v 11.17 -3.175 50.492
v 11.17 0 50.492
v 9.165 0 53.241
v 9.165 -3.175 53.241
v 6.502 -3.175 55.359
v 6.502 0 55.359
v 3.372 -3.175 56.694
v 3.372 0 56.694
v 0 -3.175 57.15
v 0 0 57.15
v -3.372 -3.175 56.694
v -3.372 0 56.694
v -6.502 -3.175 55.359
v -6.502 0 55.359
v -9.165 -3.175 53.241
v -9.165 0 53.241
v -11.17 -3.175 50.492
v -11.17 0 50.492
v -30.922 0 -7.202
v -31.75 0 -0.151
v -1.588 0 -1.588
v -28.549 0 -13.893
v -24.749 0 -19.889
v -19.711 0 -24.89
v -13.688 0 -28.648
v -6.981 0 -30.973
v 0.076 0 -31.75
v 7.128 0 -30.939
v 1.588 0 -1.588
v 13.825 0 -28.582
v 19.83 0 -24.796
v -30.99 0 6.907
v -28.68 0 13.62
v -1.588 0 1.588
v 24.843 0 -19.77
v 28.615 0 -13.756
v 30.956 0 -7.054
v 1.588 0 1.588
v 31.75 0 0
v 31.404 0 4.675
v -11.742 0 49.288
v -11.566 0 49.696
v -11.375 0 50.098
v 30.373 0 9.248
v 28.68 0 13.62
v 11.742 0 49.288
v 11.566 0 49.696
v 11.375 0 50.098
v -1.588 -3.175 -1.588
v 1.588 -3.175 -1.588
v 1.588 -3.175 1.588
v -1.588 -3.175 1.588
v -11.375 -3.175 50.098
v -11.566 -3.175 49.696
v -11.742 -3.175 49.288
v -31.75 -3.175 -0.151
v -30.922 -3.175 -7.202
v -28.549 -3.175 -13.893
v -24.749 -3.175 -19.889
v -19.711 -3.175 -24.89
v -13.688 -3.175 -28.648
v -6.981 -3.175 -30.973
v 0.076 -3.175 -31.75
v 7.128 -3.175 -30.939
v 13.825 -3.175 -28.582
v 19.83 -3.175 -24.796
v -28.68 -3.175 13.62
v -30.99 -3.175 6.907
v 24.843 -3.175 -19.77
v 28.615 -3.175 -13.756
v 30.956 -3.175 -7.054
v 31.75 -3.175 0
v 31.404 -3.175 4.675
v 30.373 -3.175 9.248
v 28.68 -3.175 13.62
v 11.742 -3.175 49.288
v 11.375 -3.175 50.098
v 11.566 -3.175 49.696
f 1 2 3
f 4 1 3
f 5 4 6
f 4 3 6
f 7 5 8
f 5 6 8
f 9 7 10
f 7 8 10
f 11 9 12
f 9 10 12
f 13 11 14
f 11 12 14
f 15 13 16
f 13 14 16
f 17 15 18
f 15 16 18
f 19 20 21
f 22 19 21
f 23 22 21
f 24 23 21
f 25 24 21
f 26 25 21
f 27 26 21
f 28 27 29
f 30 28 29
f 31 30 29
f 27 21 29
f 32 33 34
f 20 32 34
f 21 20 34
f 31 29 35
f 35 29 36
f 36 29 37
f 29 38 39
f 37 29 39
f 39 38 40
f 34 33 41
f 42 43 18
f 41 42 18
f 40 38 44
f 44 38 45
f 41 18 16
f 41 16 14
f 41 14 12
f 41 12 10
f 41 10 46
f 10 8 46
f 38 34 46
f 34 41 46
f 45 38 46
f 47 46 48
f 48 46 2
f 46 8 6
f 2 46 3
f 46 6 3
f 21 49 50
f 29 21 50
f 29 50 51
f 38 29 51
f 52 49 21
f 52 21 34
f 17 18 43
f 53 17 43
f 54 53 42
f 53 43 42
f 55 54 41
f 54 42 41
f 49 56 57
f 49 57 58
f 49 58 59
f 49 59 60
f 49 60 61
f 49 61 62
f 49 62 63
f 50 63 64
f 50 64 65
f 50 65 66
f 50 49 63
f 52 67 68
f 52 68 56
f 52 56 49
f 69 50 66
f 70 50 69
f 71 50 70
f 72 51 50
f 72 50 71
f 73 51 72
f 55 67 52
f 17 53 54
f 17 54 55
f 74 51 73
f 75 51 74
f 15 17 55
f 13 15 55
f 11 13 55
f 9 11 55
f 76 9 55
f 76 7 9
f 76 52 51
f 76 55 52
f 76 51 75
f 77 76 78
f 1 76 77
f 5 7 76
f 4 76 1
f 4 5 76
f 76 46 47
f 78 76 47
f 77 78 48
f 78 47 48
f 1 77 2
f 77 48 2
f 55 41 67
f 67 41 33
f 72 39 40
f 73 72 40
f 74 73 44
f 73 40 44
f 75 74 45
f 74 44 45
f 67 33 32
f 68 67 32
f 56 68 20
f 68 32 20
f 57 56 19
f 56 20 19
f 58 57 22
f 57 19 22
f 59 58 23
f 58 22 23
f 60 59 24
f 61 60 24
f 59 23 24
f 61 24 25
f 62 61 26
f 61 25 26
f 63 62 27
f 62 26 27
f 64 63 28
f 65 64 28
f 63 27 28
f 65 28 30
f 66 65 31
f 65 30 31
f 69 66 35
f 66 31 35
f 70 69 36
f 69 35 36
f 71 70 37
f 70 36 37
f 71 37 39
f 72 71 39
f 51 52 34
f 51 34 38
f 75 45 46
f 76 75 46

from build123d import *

# Parameters (mm, degrees)
F1_DEPTH = 3.175
F2_W     = 3.175
F2_H     = 3.175
F3_DEPTH = 3.176


with BuildPart() as f1:
    # F0 (on Front) → F1 (new body)
    with BuildSketch(Plane.XZ):
        with BuildLine():
            Line((11.1704250392, 50.4924833011), (11.7423025331, 49.2882157063))
            ThreePointArc((11.7423025331, 49.2882157063), (11.4721766161, 49.8978586334), (11.1704250392, 50.4924833011))
        make_face()
        with BuildLine():
            Line((-11.1704250392, 50.4924833011), (11.1704250392, 50.4924833011))
            ThreePointArc((11.1704250392, 50.4924833011), (0, 57.15), (-11.1704250392, 50.4924833011))
        make_face()
        with BuildLine():
            ThreePointArc((-11.1704250392, 50.4924833011), (-11.4721766161, 49.8978586334), (-11.7423025331, 49.2882157063))
            Line((-11.7423025331, 49.2882157063), (-11.1704250392, 50.4924833011))
        make_face()
        with BuildLine():
            ThreePointArc((0, 31.75), (16.965239771, 26.8373459849), (28.6804415402, 13.6196465835))
            Line((28.6804415402, 13.6196465835), (11.7423025331, 49.2882157063))
            ThreePointArc((11.7423025331, 49.2882157063), (12.4582752051, 46.9160451972), (12.7, 44.45))
            ThreePointArc((12.7, 44.45), (8.9802561211, 35.4697438789), (0, 31.75))
        make_face()
        with BuildLine():
            Line((-11.7423025331, 49.2882157063), (-28.6804415402, 13.6196465835))
            ThreePointArc((-28.6804415402, 13.6196465835), (-16.965239771, 26.8373459849), (0, 31.75))
            ThreePointArc((0, 31.75), (-10.5530881611, 37.3844264023), (-11.7423025331, 49.2882157063))
        make_face()
        with BuildLine():
            ThreePointArc((-11.7423025331, 49.2882157063), (-10.5530881611, 37.3844264023), (0, 31.75))
            ThreePointArc((0, 31.75), (8.9802561211, 35.4697438789), (12.7, 44.45))
            ThreePointArc((12.7, 44.45), (12.4582752051, 46.9160451972), (11.7423025331, 49.2882157063))
            Line((11.7423025331, 49.2882157063), (11.1704250392, 50.4924833011))
            Line((11.1704250392, 50.4924833011), (-11.1704250392, 50.4924833011))
            Line((-11.1704250392, 50.4924833011), (-11.7423025331, 49.2882157063))
        make_face()
        with BuildLine():
            ThreePointArc((-28.6804415402, 13.6196465835), (-6.9806332485, -30.9731054215), (31.75, 0))
            ThreePointArc((31.75, 0), (30.9731054215, 6.9806332485), (28.6804415402, 13.6196465835))
            ThreePointArc((28.6804415402, 13.6196465835), (16.965239771, 26.8373459849), (0, 31.75))
            ThreePointArc((0, 31.75), (-16.965239771, 26.8373459849), (-28.6804415402, 13.6196465835))
        make_face()
    extrude(amount=F1_DEPTH)

    # F2 (on face) → F3 (cut, through all)
    with BuildSketch(Plane.XZ.offset(3.175)):
        Rectangle(F2_W, F2_H)
    extrude(amount=-F3_DEPTH, mode=Mode.SUBTRACT)


solid = f1.part
